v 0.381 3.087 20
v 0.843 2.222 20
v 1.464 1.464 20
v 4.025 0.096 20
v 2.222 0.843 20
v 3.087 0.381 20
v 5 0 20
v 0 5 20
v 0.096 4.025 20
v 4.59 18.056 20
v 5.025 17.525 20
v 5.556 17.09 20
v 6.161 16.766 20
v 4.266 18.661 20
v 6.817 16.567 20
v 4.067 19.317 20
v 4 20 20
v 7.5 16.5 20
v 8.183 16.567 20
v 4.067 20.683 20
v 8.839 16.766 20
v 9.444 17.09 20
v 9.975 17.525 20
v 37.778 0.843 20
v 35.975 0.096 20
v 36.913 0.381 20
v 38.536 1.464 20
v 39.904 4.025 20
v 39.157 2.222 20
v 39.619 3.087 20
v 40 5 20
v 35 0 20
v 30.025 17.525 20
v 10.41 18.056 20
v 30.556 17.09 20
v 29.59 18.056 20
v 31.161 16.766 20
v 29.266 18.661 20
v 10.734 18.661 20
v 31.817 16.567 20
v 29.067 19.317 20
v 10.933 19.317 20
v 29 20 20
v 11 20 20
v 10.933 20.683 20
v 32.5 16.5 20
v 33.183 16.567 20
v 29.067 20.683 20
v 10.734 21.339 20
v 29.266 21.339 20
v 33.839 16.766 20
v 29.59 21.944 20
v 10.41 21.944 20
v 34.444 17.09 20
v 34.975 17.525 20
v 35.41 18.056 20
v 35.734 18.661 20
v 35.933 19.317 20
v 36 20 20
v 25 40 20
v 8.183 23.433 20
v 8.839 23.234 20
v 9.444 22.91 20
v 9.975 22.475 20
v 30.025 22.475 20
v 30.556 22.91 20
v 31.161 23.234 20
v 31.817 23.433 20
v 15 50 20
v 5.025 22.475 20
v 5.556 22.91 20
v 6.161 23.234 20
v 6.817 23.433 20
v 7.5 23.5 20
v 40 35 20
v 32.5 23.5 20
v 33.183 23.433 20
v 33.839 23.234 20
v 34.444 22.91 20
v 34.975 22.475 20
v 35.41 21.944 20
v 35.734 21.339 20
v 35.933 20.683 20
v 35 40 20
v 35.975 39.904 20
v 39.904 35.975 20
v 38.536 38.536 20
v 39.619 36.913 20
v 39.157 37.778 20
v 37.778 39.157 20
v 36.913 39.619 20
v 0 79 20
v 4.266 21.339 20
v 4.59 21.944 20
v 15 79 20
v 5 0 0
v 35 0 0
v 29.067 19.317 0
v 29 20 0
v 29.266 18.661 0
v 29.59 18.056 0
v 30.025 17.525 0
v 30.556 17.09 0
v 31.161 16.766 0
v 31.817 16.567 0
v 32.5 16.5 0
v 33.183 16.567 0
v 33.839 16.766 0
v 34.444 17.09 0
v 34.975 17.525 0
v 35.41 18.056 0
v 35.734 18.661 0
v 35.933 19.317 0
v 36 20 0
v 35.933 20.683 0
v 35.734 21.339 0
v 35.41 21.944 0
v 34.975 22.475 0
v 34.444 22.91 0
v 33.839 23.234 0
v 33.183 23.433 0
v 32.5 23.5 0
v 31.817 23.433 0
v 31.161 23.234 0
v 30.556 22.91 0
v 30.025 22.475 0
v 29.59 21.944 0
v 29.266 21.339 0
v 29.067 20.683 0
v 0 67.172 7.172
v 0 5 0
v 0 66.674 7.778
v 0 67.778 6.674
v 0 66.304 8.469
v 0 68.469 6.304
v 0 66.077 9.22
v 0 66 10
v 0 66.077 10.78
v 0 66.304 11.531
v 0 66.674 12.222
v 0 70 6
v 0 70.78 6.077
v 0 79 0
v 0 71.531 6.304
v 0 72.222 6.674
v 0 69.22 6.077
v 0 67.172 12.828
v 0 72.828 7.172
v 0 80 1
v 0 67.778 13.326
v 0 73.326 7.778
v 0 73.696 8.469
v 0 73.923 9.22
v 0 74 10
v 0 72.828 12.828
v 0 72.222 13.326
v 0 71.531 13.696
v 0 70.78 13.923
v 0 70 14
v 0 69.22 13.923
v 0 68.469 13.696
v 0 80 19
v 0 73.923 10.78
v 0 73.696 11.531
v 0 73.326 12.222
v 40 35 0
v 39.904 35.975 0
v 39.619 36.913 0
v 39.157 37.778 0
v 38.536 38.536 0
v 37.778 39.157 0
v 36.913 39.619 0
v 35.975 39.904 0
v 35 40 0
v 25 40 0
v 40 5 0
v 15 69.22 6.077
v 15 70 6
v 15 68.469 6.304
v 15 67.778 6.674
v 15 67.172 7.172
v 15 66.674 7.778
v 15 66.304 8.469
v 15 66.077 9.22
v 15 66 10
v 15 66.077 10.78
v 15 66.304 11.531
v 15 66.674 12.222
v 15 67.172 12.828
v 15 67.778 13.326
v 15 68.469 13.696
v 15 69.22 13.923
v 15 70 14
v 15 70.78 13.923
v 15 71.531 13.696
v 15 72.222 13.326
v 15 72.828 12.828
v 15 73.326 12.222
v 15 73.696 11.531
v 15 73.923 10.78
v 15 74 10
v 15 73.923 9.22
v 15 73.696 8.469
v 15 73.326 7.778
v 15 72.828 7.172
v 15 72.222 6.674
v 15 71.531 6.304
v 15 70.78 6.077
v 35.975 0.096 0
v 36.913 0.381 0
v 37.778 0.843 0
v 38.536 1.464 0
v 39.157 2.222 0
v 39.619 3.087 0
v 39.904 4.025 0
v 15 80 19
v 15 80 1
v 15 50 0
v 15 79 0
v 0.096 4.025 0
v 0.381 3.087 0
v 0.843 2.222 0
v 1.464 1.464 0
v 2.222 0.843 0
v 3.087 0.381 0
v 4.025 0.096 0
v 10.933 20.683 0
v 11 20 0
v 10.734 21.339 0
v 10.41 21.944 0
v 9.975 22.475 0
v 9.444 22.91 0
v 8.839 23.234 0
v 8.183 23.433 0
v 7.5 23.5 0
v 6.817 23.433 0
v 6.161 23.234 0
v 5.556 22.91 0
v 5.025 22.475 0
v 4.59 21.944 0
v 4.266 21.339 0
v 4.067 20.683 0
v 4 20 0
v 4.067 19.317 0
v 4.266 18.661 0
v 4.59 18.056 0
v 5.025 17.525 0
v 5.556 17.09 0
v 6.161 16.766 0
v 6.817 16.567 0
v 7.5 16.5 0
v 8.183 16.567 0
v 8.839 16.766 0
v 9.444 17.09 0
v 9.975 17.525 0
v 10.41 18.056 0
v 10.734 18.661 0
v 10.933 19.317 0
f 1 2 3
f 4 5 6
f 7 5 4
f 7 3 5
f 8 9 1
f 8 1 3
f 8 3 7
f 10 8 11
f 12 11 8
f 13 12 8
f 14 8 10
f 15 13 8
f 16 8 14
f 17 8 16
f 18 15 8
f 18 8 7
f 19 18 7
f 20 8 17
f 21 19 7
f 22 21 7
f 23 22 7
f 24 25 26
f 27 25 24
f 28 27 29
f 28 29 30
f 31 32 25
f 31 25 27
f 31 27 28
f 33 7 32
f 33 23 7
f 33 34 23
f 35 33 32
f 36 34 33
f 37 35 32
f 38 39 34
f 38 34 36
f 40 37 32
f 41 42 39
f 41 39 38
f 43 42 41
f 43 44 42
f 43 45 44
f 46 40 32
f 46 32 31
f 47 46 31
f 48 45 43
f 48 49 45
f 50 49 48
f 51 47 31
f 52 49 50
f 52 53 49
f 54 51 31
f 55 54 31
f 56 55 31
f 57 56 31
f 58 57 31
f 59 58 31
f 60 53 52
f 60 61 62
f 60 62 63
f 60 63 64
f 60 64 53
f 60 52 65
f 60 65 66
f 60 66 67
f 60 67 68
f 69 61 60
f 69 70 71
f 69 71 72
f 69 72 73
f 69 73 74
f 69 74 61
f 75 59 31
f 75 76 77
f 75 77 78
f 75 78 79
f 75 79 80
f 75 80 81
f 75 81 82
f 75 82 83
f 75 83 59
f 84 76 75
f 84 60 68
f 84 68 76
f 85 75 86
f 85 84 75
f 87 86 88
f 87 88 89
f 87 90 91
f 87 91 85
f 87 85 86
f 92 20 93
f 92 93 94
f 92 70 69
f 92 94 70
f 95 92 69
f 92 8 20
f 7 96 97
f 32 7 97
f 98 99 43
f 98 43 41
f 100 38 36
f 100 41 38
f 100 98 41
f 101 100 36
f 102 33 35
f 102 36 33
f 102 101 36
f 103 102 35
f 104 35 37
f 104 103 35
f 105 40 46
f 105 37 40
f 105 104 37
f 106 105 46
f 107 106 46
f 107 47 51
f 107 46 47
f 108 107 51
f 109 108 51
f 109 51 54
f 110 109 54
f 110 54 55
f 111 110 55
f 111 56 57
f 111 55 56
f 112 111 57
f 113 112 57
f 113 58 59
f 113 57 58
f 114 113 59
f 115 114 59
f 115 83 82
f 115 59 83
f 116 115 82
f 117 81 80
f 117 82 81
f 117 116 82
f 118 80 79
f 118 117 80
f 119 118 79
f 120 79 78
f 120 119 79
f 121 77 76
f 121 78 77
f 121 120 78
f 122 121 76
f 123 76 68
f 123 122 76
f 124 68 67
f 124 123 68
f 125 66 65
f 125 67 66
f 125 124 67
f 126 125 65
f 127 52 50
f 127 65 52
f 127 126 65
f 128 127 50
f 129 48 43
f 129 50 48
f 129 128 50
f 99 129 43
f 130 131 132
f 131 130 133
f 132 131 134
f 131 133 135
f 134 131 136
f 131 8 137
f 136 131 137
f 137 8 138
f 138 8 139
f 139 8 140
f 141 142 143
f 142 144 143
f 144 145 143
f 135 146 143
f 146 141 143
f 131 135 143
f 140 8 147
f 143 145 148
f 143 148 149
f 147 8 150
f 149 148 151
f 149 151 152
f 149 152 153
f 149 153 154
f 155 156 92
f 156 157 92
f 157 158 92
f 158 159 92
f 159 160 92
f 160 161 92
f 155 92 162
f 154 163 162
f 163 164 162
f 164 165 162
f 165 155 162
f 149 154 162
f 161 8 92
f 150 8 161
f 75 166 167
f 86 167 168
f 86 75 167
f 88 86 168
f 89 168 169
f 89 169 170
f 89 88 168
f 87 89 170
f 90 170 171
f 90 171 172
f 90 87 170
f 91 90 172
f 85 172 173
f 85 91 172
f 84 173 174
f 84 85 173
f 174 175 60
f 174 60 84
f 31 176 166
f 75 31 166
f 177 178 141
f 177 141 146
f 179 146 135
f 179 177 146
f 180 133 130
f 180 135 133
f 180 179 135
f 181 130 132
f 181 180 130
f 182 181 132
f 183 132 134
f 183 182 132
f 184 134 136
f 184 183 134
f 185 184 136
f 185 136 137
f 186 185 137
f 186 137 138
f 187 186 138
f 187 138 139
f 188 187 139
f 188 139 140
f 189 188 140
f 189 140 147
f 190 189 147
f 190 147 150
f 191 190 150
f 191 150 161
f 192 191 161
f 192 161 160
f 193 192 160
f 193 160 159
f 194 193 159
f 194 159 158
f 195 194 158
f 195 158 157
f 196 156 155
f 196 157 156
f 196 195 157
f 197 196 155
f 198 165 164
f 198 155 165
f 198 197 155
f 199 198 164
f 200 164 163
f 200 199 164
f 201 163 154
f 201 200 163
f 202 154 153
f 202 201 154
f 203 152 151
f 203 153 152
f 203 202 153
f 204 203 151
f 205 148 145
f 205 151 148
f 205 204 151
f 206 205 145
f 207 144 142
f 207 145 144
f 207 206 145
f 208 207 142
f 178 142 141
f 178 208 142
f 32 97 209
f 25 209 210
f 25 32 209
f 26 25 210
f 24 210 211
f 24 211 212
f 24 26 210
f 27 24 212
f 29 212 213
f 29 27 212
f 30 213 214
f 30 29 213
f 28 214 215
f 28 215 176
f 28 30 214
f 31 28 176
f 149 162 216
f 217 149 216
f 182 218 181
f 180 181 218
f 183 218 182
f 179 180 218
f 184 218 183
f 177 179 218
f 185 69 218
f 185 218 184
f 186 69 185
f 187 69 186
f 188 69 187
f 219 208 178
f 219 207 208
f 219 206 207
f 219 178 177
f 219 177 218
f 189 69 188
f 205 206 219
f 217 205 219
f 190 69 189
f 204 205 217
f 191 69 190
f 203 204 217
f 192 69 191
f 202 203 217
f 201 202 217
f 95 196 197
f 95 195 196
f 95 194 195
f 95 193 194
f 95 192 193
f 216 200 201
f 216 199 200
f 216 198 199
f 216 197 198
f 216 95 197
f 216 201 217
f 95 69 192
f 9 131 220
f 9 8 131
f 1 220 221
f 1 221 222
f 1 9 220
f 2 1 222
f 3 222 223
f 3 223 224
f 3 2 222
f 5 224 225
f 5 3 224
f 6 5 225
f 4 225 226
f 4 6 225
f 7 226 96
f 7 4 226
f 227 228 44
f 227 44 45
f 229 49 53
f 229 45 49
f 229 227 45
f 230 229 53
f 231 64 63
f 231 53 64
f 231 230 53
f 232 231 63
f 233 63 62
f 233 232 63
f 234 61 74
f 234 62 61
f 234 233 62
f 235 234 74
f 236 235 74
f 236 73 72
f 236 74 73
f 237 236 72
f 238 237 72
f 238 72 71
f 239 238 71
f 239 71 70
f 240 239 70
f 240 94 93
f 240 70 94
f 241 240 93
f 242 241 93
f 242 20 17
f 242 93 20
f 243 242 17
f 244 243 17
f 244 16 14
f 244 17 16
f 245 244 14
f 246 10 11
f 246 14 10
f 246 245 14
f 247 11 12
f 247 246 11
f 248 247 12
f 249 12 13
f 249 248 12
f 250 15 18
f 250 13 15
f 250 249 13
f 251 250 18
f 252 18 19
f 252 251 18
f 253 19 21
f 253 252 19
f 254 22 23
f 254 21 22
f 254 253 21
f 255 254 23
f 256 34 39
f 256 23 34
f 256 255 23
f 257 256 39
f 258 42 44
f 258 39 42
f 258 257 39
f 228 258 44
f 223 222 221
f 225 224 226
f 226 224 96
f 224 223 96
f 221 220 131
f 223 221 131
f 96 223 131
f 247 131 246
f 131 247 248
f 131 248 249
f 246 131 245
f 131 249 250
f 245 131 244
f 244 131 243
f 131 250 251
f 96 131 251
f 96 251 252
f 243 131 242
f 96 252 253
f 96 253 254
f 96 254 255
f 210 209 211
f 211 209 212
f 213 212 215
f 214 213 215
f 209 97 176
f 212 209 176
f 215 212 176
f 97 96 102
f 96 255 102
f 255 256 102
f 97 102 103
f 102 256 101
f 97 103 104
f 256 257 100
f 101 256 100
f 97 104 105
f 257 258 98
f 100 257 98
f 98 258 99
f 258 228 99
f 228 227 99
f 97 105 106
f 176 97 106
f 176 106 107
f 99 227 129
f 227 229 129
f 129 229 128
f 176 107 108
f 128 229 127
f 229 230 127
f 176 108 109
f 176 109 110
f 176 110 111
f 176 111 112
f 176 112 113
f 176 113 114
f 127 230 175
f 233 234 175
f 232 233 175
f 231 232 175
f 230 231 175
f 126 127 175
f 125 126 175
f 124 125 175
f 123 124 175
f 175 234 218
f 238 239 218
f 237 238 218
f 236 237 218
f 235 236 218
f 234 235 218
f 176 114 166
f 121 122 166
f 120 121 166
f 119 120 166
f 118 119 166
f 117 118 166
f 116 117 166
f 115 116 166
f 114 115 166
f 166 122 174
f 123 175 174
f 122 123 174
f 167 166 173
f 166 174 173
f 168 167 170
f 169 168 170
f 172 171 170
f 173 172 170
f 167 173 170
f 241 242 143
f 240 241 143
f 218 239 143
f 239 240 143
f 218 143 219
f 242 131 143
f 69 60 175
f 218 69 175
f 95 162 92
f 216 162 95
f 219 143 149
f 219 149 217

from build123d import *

# Parameters (mm, degrees)
ESQUISSE1_W                  = 40
ESQUISSE1_H                  = 40
BOSS_EXTRU_1_DEPTH           = 20
ESQUISSE2_W                  = 15
ESQUISSE2_H                  = 40
BOSS_EXTRU_2_DEPTH           = 20
ENL_V_MAT_EXTRU_1_DEPTH      = 92.651513899
ENL_V_MAT_EXTRU_1_DEPTH_BACK = 92.651513899
ESQUISSE3_R                  = 3.5
ENL_V_MAT_EXTRU_2_DEPTH      = 92.651513899
ENL_V_MAT_EXTRU_2_DEPTH_BACK = 92.651513899
ESQUISSE4_R                  = 4
CONG_1_R                     = 5
CHANFREIN1_SIZE              = 10
CHANFREIN2_SIZE              = 1


with BuildPart() as part:
    # Esquisse1 → Boss.-Extru.1 (new body)
    with BuildSketch(Plane.XY):
        with Locations((20, 20)):
            Rectangle(ESQUISSE1_W, ESQUISSE1_H)
    extrude(amount=BOSS_EXTRU_1_DEPTH)

    # Esquisse2 → Boss.-Extru.2 (add)
    with BuildSketch(Plane.XY.offset(20)):
        with Locations((7.5, 60)):
            Rectangle(ESQUISSE2_W, ESQUISSE2_H)
    extrude(amount=-BOSS_EXTRU_2_DEPTH)

    # Esquisse3 → Enlèv. mat.-Extru.1 (cut, two sides: drawn at the far end of the back side and taken through both)
    with BuildSketch(Plane.XY.offset(20).offset(-ENL_V_MAT_EXTRU_1_DEPTH_BACK)):
        with Locations((7.5, 20)):
            Circle(ESQUISSE3_R)
        with Locations(Location((32.5, 20, 0), (0, 0, 180))):
            Circle(ESQUISSE3_R)
    extrude(amount=ENL_V_MAT_EXTRU_1_DEPTH + ENL_V_MAT_EXTRU_1_DEPTH_BACK, mode=Mode.SUBTRACT)

    # Esquisse4 → Enlèv. mat.-Extru.2 (cut, two sides: drawn at the far end of the back side and taken through both)
    with BuildSketch(Plane.ZY.offset(-ENL_V_MAT_EXTRU_2_DEPTH_BACK)):
        with Locations(Location((10, 70, 0), (0, 0, 180))):
            Circle(ESQUISSE4_R)
    extrude(amount=ENL_V_MAT_EXTRU_2_DEPTH + ENL_V_MAT_EXTRU_2_DEPTH_BACK, mode=Mode.SUBTRACT)

    # Congé1
    cong_1_edges = [part.edges().sort_by_distance(p)[0] for p in [
        (40, 40, 10),
        (40, 0, 10),
        (0, 0, 10),
    ]]
    fillet(cong_1_edges, radius=CONG_1_R)

    # Chanfrein1
    chanfrein1_edges = [part.edges().sort_by_distance(p)[0] for p in [
        (15, 40, 10),
    ]]
    chamfer(chanfrein1_edges, length=CHANFREIN1_SIZE)

    # Chanfrein2
    chanfrein2_edges = [part.edges().sort_by_distance(p)[0] for p in [
        (7.5, 80, 0),
        (7.5, 80, 20),
    ]]
    chamfer(chanfrein2_edges, length=CHANFREIN2_SIZE)


solid = part.part
